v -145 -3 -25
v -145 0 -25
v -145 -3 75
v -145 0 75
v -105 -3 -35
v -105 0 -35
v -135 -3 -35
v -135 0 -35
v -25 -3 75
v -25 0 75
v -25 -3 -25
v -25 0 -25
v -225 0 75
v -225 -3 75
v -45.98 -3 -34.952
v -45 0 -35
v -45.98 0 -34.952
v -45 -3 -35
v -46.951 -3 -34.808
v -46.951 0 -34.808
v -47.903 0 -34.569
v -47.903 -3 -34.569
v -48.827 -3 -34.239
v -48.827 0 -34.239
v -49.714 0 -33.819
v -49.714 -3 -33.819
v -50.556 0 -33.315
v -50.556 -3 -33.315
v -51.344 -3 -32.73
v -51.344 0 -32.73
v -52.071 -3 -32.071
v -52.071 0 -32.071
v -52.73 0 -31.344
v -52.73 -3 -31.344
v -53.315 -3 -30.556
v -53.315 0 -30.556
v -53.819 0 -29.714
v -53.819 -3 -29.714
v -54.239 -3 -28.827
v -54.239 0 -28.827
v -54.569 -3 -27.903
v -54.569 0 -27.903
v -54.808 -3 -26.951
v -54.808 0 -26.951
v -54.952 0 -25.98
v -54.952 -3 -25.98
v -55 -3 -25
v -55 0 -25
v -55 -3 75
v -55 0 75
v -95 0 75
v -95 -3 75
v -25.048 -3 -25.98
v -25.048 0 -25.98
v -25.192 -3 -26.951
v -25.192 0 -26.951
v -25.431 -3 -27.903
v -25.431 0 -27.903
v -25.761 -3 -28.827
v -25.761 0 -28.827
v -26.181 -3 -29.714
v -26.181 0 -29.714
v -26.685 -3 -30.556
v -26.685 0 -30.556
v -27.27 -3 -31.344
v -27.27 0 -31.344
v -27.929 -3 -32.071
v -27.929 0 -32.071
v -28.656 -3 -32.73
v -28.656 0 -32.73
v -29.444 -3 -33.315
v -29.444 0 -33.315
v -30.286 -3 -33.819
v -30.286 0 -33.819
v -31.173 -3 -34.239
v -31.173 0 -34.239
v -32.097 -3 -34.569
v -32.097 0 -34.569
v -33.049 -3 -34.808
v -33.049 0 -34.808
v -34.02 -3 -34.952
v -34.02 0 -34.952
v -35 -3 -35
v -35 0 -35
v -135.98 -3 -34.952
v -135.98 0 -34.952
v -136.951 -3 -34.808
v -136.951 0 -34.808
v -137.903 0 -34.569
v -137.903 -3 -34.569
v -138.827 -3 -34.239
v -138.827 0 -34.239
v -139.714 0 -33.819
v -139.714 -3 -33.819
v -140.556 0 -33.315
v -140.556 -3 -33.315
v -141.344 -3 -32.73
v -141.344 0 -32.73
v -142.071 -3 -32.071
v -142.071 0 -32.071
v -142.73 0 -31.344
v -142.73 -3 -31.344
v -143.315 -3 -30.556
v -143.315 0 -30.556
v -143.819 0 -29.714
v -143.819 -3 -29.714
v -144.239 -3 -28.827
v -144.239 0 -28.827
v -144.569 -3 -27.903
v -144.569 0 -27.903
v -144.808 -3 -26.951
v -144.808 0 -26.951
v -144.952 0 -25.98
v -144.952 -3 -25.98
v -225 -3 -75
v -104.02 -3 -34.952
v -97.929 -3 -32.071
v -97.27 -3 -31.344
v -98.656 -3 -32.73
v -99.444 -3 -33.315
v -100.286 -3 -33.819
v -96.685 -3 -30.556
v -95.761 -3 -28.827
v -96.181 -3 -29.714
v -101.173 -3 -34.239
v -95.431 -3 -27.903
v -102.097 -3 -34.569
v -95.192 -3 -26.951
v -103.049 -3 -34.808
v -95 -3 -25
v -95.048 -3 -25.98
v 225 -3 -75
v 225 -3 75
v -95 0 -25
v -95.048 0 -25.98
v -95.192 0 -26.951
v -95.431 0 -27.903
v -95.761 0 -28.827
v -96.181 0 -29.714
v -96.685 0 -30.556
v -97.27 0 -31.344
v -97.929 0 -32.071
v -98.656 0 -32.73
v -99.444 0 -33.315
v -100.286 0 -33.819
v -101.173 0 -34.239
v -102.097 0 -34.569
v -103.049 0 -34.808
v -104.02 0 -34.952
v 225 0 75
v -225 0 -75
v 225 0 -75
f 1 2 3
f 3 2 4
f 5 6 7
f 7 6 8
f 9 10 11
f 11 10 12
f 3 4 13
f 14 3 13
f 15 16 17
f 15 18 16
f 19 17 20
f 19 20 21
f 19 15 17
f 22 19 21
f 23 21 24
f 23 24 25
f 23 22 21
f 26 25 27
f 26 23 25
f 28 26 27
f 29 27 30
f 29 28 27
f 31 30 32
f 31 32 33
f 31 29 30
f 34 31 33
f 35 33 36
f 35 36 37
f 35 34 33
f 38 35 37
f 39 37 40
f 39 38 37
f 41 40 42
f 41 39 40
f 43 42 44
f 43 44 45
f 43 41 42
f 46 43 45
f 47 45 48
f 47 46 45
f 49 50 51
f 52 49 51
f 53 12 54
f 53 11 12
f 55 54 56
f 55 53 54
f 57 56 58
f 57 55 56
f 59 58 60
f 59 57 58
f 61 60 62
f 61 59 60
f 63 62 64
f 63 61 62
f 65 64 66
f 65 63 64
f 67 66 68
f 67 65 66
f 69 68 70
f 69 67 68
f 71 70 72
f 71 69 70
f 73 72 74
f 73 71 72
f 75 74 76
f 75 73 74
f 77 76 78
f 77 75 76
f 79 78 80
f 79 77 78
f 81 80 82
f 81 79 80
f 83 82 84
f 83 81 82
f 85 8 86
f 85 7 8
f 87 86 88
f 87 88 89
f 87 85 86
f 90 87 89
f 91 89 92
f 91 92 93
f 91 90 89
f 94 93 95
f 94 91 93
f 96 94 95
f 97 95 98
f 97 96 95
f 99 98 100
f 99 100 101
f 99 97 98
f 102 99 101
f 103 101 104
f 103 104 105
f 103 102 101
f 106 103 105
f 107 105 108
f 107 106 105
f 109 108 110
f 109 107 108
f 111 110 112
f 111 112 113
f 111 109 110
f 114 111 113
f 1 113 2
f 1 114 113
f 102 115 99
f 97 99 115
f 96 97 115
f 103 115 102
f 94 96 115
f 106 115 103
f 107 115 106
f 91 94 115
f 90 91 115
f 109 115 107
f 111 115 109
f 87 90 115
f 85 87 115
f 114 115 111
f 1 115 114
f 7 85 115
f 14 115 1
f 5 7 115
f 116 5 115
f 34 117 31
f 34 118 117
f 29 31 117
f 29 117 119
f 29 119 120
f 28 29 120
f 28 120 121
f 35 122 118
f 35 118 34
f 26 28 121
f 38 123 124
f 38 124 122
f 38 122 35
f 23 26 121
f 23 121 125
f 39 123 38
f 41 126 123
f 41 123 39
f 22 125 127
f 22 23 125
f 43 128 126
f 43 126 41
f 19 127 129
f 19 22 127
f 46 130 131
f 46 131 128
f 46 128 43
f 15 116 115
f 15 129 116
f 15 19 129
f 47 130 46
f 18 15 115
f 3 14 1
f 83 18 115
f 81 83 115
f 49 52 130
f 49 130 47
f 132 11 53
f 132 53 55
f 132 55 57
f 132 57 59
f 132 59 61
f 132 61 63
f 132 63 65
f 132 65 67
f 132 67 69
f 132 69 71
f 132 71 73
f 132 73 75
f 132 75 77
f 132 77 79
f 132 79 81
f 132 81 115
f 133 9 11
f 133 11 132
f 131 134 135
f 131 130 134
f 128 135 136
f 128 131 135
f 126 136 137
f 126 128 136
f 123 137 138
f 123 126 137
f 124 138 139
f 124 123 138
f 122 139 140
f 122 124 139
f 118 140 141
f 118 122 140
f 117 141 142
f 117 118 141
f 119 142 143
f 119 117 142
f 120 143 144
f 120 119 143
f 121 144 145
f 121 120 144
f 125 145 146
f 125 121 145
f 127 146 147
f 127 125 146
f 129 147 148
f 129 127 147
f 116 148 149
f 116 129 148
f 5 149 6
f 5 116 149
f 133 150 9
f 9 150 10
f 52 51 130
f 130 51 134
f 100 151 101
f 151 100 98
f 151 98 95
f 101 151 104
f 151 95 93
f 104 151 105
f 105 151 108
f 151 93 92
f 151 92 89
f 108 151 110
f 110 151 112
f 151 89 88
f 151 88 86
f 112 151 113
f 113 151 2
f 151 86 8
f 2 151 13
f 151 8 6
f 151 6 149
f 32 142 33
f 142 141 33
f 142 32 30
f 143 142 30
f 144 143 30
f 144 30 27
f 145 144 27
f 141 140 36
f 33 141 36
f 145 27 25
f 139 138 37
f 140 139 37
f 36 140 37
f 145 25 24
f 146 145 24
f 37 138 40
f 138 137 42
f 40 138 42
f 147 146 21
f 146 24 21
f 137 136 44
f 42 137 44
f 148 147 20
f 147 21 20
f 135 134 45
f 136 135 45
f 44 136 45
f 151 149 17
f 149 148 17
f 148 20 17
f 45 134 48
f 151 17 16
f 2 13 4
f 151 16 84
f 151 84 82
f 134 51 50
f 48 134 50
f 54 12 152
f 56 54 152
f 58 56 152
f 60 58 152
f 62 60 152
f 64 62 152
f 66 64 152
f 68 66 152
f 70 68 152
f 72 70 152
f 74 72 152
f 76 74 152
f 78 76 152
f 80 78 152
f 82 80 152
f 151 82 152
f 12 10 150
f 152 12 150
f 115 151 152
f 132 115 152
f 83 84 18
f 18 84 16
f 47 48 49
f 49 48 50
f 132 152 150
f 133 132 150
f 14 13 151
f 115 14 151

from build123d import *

# Parameters (mm, degrees)
F1_DEPTH = 3
F2_R     = 10


with BuildPart() as f1:
    # F0 (on Front) → F1 (new body)
    with BuildSketch(Plane.XZ):
        Polygon((-225, 75), (-225, -75), (225, -75), (225, 75), (-25, 75), (-25, -35), (-55, -35), (-55, 75), (-95, 75), (-95, -35), (-145, -35), (-145, 75), align=None)
    extrude(amount=F1_DEPTH)

    # F2
    f2_edges = [f1.edges().sort_by_distance(p)[0] for p in [
        (-145, -1.5, -35),
        (-95, -1.5, -35),
        (-25, -1.5, -35),
        (-55, -1.5, -35),
    ]]
    fillet(f2_edges, radius=F2_R)


solid = f1.part
